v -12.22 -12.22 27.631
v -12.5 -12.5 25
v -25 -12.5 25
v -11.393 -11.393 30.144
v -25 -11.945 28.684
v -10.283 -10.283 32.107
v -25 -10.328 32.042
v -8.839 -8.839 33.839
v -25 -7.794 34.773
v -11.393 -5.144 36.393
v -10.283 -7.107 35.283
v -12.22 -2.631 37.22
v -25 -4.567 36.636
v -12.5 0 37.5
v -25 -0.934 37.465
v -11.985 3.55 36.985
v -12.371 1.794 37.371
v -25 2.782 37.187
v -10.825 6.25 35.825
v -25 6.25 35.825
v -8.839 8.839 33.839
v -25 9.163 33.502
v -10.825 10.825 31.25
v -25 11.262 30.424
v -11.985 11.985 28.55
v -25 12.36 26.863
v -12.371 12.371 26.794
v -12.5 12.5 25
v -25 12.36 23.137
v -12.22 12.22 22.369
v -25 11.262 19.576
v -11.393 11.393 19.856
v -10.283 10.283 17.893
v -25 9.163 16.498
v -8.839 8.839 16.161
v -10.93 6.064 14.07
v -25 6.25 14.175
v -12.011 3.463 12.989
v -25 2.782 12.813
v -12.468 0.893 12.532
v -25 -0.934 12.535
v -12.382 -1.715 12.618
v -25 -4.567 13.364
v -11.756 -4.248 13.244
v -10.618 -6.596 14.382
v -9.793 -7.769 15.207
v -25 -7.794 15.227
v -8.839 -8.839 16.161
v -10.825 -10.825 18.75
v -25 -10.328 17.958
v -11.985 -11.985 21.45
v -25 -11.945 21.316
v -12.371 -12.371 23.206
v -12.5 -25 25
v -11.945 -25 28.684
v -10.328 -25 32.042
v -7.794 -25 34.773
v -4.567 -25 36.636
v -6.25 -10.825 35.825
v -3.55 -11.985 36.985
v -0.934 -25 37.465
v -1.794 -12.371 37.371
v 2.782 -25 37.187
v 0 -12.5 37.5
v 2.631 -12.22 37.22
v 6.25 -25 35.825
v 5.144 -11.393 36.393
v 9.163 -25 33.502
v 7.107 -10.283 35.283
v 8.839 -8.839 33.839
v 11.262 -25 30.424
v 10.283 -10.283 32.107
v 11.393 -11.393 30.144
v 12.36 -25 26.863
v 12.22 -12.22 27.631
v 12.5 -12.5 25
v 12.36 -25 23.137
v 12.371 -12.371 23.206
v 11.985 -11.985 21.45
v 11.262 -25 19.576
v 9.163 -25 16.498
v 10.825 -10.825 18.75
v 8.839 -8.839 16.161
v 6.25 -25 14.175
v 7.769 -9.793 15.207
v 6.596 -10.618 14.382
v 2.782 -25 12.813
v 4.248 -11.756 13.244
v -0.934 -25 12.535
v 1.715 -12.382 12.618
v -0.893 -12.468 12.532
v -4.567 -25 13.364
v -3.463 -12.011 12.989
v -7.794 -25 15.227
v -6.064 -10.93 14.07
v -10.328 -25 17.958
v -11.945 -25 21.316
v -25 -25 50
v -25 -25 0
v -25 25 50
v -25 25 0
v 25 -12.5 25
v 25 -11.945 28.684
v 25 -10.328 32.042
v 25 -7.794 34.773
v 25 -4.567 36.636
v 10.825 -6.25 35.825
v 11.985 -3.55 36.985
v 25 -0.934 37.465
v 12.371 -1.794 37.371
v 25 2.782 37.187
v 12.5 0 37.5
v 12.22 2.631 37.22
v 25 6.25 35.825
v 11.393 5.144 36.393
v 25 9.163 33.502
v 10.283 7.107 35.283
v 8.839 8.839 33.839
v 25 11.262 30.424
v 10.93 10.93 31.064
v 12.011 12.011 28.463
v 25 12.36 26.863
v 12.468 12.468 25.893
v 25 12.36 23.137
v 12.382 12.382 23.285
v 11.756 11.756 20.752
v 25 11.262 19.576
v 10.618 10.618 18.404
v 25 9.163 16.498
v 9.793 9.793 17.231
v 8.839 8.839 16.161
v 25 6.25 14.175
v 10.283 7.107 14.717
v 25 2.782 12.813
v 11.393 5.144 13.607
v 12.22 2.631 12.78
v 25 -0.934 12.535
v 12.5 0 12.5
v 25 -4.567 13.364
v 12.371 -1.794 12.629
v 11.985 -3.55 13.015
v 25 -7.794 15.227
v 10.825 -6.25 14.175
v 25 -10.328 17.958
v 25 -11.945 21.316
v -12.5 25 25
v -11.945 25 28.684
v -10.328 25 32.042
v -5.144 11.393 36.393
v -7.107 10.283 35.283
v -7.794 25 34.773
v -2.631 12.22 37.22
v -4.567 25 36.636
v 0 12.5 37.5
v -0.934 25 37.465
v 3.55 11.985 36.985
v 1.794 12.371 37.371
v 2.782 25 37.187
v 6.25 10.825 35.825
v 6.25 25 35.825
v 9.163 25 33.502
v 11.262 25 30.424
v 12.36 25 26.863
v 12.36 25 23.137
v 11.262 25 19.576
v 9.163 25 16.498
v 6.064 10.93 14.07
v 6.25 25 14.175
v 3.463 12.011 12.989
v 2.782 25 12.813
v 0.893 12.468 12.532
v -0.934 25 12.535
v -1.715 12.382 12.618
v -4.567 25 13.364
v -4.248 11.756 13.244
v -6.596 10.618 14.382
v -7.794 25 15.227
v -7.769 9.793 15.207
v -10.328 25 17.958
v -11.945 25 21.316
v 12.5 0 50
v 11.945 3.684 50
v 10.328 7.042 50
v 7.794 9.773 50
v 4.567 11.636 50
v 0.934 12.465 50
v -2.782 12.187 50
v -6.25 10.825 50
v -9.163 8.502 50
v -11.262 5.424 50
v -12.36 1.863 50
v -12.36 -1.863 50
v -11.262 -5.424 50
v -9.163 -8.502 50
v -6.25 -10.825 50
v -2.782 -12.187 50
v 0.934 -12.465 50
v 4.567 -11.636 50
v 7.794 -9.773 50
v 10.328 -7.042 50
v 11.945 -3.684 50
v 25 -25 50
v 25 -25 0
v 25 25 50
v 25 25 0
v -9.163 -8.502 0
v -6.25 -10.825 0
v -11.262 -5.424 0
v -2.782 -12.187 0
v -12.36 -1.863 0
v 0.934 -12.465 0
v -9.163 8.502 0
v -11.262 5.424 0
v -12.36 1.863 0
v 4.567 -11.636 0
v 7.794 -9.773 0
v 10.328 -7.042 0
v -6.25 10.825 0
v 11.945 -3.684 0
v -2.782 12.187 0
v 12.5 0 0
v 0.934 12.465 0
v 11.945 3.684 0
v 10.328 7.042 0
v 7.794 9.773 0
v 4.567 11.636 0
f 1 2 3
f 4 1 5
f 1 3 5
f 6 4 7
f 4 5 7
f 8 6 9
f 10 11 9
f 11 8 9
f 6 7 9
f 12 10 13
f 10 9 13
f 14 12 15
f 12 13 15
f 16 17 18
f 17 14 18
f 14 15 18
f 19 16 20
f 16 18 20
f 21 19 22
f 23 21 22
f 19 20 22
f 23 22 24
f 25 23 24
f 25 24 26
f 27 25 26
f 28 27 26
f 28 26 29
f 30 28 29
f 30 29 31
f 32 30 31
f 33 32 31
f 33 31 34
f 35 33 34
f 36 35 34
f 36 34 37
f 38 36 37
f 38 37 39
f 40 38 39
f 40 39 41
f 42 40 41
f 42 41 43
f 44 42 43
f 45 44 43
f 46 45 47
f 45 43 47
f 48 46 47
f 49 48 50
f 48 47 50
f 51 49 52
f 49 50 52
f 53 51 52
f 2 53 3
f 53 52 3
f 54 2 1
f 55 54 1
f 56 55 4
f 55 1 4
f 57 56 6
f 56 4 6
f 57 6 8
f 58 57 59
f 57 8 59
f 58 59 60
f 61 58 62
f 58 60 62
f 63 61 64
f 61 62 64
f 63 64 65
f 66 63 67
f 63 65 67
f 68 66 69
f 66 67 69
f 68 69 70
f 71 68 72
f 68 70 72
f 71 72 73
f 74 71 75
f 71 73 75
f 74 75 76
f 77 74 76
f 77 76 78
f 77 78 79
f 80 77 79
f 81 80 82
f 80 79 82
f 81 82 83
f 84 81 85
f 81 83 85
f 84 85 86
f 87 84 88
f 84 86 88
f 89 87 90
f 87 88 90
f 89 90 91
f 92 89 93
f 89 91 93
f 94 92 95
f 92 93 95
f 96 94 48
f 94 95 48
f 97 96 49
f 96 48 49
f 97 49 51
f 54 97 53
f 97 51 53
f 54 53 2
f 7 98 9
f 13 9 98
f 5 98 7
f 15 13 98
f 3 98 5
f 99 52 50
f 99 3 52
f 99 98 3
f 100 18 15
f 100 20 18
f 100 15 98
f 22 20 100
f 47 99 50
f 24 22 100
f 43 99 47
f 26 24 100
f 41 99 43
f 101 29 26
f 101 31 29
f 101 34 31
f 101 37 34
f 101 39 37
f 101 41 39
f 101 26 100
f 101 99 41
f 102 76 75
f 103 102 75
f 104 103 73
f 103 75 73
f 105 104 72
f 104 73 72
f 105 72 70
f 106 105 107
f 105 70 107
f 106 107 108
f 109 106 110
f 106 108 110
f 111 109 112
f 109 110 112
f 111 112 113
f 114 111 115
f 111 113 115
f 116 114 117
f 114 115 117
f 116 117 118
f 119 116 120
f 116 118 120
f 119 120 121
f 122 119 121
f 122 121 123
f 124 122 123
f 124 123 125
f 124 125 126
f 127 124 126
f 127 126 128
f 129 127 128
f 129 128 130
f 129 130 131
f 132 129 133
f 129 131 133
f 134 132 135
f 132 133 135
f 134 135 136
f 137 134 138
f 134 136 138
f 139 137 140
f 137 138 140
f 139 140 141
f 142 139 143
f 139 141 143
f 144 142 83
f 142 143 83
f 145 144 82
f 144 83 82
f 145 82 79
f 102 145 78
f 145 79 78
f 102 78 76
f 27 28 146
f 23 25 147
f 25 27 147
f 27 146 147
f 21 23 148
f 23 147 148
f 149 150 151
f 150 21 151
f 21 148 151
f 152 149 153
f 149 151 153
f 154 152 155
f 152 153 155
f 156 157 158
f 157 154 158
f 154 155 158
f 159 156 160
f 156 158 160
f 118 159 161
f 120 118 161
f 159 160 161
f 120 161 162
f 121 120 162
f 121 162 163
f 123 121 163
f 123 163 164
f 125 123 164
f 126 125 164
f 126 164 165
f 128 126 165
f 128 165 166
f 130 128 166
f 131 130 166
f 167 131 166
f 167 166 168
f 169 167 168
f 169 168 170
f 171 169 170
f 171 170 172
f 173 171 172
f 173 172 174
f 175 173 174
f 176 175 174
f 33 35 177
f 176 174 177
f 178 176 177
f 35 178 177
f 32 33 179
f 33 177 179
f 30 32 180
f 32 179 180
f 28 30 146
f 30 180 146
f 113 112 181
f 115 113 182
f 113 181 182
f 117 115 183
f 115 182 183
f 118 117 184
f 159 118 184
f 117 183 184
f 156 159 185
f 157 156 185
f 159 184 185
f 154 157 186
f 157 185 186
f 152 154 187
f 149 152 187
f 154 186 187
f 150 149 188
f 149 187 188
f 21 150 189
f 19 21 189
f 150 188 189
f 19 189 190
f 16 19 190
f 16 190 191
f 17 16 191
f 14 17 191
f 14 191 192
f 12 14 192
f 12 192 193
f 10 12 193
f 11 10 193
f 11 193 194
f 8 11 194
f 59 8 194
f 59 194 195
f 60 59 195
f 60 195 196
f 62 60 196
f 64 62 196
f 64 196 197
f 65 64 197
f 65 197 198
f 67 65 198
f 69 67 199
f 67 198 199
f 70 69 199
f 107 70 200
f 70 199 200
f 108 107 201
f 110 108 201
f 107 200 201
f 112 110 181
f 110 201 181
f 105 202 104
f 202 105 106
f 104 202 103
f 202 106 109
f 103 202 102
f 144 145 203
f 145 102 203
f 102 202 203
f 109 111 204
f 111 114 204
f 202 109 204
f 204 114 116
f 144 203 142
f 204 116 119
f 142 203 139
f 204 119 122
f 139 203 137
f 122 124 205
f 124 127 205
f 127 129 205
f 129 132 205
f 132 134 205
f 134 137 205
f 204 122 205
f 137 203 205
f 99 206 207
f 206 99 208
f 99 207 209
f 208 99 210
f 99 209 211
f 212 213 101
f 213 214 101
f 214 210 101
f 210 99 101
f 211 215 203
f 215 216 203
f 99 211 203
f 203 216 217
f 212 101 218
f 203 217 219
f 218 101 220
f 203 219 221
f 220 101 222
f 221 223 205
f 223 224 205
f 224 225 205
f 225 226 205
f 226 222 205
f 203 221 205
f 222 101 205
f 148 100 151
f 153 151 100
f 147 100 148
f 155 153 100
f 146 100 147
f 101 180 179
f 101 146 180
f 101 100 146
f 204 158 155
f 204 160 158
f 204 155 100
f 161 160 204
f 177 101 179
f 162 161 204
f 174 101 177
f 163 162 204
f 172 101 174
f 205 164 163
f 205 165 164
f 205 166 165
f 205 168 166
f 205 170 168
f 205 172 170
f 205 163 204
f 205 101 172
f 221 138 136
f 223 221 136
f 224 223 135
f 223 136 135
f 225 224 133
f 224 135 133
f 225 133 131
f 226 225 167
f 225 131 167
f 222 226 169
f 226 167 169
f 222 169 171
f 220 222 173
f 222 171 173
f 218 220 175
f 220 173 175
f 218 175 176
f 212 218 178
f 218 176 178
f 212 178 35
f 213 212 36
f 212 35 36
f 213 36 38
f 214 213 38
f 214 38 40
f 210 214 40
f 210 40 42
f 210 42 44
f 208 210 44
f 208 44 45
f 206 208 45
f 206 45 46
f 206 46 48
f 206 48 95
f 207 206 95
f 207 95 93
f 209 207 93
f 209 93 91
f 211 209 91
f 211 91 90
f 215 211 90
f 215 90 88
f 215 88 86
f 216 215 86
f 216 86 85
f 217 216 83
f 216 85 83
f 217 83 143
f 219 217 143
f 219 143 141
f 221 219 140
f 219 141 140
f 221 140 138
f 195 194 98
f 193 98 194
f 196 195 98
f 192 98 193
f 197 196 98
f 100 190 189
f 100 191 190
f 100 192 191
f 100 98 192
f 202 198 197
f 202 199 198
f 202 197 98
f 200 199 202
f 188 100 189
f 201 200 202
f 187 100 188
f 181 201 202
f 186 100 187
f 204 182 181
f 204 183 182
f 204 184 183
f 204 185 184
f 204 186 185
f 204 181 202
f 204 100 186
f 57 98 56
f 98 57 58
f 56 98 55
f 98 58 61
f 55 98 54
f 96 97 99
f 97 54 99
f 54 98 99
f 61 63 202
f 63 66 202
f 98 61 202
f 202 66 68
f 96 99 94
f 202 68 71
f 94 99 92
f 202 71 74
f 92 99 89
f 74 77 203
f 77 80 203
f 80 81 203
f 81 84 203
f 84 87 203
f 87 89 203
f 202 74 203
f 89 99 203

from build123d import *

# Parameters (mm, degrees)
F0_W     = 50
F0_H     = 50
F1_DEPTH = 50
F2_R     = 12.5
F3_DEPTH = 50
F4_R     = 12.5
F5_DEPTH = 50
F6_R     = 12.5
F7_DEPTH = 50


with BuildPart() as f1:
    # F0 (on Top) → F1 (new body)
    with BuildSketch(Plane.XY):
        Rectangle(F0_W, F0_H)
    extrude(amount=F1_DEPTH)

    # F2 (on face) → F3 (cut)
    with BuildSketch(Plane.XY.offset(50)):
        Circle(F2_R)
    extrude(amount=-F3_DEPTH, mode=Mode.SUBTRACT)

    # F4 (on face) → F5 (cut)
    with BuildSketch(Plane(origin=(-25, 0, 0), x_dir=(0, -1, 0), z_dir=(-1, 0, 0))):
        with Locations((0, 25)):
            Circle(F4_R)
    extrude(amount=-F5_DEPTH, mode=Mode.SUBTRACT)

    # F6 (on face) → F7 (cut)
    with BuildSketch(Plane(origin=(0, 25, 0), x_dir=(-1, 0, 0), z_dir=(0, 1, 0))):
        with Locations((0, 25)):
            Circle(F6_R)
    extrude(amount=-F7_DEPTH, mode=Mode.SUBTRACT)


solid = f1.part
